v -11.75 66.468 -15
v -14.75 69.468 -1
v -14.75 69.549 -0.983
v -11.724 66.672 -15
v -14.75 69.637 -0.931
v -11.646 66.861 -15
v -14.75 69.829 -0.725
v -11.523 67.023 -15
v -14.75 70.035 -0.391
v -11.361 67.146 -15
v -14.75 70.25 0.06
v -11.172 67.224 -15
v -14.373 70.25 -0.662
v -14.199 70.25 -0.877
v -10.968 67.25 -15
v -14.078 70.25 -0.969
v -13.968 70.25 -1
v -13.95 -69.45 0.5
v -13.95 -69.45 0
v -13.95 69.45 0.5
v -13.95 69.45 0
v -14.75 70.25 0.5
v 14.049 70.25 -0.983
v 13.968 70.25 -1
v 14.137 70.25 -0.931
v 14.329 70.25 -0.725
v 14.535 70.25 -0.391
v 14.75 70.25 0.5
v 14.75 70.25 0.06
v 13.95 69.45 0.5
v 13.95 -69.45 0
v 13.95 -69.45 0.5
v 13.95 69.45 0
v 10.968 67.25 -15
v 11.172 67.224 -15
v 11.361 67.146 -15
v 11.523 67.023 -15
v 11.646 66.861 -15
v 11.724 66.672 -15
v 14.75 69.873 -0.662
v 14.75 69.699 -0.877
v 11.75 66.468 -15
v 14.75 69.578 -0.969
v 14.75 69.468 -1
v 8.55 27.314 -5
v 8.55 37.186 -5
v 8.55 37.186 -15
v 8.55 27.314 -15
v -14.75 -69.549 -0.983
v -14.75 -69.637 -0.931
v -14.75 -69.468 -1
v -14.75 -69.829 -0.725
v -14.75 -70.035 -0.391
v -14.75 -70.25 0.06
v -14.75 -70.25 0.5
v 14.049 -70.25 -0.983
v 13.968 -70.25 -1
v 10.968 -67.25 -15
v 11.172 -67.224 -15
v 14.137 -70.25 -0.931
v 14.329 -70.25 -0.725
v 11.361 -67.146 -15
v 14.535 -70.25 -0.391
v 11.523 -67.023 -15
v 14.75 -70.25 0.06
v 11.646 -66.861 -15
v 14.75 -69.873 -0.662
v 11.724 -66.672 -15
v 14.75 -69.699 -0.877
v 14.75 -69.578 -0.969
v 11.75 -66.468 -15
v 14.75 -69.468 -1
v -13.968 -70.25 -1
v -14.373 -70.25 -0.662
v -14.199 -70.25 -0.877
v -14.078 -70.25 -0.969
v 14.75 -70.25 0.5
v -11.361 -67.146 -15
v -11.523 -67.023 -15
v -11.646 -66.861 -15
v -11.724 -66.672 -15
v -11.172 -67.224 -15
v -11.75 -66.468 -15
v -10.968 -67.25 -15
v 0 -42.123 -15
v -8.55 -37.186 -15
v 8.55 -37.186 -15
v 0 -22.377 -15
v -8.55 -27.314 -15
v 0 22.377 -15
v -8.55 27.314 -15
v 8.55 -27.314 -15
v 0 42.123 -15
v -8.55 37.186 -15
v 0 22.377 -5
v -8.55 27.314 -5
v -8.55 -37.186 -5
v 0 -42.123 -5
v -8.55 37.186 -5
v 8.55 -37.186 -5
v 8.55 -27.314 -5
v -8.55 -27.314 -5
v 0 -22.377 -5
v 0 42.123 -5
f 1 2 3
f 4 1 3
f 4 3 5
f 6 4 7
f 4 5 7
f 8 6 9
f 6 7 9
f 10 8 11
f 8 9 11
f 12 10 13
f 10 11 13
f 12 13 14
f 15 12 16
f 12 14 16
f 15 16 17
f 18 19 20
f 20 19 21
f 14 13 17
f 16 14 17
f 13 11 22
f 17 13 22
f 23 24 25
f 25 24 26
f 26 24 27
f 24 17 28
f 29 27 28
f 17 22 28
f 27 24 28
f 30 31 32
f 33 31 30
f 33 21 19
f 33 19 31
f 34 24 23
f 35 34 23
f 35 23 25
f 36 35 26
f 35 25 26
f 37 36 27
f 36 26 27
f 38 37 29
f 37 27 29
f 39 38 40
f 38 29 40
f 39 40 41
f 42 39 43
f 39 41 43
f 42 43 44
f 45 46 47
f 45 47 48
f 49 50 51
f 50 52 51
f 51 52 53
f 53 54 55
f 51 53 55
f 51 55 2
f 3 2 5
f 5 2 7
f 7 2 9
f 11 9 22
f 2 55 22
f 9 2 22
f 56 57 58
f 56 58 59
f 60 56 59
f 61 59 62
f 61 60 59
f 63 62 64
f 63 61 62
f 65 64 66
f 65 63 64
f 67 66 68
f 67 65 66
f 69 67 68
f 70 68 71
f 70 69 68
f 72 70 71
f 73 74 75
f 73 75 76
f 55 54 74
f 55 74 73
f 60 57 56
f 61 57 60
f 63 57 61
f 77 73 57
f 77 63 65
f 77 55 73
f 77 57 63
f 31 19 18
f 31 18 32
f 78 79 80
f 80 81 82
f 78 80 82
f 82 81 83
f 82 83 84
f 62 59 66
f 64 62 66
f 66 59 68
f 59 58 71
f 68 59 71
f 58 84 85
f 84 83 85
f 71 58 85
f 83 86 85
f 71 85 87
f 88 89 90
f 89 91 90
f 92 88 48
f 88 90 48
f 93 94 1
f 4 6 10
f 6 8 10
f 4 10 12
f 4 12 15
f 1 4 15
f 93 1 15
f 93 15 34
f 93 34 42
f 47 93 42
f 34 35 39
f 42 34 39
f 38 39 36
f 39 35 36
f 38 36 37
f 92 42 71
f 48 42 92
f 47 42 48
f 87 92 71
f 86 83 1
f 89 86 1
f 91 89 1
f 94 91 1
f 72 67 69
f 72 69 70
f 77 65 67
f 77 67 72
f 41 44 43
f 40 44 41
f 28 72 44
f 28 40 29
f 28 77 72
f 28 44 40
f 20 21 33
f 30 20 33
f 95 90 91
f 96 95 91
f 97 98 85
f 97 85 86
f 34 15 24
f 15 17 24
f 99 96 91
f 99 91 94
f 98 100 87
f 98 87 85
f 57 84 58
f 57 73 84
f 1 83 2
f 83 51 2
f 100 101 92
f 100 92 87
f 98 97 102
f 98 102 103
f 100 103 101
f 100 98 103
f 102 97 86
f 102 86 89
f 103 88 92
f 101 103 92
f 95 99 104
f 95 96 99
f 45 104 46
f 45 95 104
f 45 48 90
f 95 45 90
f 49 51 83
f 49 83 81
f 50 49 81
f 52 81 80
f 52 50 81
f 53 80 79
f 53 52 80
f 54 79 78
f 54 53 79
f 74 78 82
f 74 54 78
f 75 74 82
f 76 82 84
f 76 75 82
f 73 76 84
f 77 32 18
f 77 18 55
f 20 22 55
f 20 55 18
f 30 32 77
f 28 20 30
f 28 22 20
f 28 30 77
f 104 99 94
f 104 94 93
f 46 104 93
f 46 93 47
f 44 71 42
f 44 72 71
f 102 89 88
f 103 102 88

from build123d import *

# Parameters (mm, degrees)
F1_W     = 29.5
F1_H     = 140.5
F1_W_2   = 27.9
F1_H_2   = 138.9
F2_DEPTH = 0.5
F3_DEPTH = 15
F4_SIZE2 = 14
F4_SIZE  = 3
F5_R     = 0.8
F7_DEPTH = 10


with BuildPart() as f2:
    # F1 (on Top) → F2 (new body)
    with BuildSketch(Plane.XY):
        Rectangle(F1_W, F1_H)
        Rectangle(F1_W_2, F1_H_2, mode=Mode.SUBTRACT)
    extrude(amount=F2_DEPTH)

    # F1 (on Top) → F3 (join)
    with BuildSketch(Plane.XY):
        Rectangle(F1_W, F1_H)
        Rectangle(F1_W_2, F1_H_2, mode=Mode.SUBTRACT)
        Rectangle(F1_W_2, F1_H_2)
    extrude(amount=-F3_DEPTH)

    # F4
    f4_edges = [f2.edges().sort_by_distance(p)[0] for p in [
        (0, -70.25, -15),
        (14.75, 0, -15),
        (0, 70.25, -15),
        (-14.75, 0, -15),
    ]]
    f4_side = f2.faces().sort_by_distance((0, 0, -15))[0]
    chamfer(f4_edges, length=F4_SIZE, length2=F4_SIZE2, reference=f4_side)

    # F5
    f5_edges = [f2.edges().sort_by_distance(p)[0] for p in [
        (13.25, 68.75, -8),
        (-13.25, 68.75, -8),
        (13.25, -68.75, -8),
        (-13.25, -68.75, -8),
    ]]
    fillet(f5_edges, radius=F5_R)

    # F6 (on face) → F7 (cut)
    with BuildSketch(Plane(origin=(0, 0, -15), x_dir=(1, 0, 0), z_dir=(0, 0, -1))):
        Polygon((-8.55, 37.1863448016), (-8.55, 27.3136551984), (0, 22.3773103969), (8.55, 27.3136551984), (8.55, 37.1863448016), (0, 42.1226896031), align=None)
        Polygon((-8.55, -37.1863448016), (0, -42.1226896031), (8.55, -37.1863448016), (8.55, -27.3136551984), (0, -22.3773103969), (-8.55, -27.3136551984), align=None)
    extrude(amount=-F7_DEPTH, mode=Mode.SUBTRACT)


solid = f2.part
